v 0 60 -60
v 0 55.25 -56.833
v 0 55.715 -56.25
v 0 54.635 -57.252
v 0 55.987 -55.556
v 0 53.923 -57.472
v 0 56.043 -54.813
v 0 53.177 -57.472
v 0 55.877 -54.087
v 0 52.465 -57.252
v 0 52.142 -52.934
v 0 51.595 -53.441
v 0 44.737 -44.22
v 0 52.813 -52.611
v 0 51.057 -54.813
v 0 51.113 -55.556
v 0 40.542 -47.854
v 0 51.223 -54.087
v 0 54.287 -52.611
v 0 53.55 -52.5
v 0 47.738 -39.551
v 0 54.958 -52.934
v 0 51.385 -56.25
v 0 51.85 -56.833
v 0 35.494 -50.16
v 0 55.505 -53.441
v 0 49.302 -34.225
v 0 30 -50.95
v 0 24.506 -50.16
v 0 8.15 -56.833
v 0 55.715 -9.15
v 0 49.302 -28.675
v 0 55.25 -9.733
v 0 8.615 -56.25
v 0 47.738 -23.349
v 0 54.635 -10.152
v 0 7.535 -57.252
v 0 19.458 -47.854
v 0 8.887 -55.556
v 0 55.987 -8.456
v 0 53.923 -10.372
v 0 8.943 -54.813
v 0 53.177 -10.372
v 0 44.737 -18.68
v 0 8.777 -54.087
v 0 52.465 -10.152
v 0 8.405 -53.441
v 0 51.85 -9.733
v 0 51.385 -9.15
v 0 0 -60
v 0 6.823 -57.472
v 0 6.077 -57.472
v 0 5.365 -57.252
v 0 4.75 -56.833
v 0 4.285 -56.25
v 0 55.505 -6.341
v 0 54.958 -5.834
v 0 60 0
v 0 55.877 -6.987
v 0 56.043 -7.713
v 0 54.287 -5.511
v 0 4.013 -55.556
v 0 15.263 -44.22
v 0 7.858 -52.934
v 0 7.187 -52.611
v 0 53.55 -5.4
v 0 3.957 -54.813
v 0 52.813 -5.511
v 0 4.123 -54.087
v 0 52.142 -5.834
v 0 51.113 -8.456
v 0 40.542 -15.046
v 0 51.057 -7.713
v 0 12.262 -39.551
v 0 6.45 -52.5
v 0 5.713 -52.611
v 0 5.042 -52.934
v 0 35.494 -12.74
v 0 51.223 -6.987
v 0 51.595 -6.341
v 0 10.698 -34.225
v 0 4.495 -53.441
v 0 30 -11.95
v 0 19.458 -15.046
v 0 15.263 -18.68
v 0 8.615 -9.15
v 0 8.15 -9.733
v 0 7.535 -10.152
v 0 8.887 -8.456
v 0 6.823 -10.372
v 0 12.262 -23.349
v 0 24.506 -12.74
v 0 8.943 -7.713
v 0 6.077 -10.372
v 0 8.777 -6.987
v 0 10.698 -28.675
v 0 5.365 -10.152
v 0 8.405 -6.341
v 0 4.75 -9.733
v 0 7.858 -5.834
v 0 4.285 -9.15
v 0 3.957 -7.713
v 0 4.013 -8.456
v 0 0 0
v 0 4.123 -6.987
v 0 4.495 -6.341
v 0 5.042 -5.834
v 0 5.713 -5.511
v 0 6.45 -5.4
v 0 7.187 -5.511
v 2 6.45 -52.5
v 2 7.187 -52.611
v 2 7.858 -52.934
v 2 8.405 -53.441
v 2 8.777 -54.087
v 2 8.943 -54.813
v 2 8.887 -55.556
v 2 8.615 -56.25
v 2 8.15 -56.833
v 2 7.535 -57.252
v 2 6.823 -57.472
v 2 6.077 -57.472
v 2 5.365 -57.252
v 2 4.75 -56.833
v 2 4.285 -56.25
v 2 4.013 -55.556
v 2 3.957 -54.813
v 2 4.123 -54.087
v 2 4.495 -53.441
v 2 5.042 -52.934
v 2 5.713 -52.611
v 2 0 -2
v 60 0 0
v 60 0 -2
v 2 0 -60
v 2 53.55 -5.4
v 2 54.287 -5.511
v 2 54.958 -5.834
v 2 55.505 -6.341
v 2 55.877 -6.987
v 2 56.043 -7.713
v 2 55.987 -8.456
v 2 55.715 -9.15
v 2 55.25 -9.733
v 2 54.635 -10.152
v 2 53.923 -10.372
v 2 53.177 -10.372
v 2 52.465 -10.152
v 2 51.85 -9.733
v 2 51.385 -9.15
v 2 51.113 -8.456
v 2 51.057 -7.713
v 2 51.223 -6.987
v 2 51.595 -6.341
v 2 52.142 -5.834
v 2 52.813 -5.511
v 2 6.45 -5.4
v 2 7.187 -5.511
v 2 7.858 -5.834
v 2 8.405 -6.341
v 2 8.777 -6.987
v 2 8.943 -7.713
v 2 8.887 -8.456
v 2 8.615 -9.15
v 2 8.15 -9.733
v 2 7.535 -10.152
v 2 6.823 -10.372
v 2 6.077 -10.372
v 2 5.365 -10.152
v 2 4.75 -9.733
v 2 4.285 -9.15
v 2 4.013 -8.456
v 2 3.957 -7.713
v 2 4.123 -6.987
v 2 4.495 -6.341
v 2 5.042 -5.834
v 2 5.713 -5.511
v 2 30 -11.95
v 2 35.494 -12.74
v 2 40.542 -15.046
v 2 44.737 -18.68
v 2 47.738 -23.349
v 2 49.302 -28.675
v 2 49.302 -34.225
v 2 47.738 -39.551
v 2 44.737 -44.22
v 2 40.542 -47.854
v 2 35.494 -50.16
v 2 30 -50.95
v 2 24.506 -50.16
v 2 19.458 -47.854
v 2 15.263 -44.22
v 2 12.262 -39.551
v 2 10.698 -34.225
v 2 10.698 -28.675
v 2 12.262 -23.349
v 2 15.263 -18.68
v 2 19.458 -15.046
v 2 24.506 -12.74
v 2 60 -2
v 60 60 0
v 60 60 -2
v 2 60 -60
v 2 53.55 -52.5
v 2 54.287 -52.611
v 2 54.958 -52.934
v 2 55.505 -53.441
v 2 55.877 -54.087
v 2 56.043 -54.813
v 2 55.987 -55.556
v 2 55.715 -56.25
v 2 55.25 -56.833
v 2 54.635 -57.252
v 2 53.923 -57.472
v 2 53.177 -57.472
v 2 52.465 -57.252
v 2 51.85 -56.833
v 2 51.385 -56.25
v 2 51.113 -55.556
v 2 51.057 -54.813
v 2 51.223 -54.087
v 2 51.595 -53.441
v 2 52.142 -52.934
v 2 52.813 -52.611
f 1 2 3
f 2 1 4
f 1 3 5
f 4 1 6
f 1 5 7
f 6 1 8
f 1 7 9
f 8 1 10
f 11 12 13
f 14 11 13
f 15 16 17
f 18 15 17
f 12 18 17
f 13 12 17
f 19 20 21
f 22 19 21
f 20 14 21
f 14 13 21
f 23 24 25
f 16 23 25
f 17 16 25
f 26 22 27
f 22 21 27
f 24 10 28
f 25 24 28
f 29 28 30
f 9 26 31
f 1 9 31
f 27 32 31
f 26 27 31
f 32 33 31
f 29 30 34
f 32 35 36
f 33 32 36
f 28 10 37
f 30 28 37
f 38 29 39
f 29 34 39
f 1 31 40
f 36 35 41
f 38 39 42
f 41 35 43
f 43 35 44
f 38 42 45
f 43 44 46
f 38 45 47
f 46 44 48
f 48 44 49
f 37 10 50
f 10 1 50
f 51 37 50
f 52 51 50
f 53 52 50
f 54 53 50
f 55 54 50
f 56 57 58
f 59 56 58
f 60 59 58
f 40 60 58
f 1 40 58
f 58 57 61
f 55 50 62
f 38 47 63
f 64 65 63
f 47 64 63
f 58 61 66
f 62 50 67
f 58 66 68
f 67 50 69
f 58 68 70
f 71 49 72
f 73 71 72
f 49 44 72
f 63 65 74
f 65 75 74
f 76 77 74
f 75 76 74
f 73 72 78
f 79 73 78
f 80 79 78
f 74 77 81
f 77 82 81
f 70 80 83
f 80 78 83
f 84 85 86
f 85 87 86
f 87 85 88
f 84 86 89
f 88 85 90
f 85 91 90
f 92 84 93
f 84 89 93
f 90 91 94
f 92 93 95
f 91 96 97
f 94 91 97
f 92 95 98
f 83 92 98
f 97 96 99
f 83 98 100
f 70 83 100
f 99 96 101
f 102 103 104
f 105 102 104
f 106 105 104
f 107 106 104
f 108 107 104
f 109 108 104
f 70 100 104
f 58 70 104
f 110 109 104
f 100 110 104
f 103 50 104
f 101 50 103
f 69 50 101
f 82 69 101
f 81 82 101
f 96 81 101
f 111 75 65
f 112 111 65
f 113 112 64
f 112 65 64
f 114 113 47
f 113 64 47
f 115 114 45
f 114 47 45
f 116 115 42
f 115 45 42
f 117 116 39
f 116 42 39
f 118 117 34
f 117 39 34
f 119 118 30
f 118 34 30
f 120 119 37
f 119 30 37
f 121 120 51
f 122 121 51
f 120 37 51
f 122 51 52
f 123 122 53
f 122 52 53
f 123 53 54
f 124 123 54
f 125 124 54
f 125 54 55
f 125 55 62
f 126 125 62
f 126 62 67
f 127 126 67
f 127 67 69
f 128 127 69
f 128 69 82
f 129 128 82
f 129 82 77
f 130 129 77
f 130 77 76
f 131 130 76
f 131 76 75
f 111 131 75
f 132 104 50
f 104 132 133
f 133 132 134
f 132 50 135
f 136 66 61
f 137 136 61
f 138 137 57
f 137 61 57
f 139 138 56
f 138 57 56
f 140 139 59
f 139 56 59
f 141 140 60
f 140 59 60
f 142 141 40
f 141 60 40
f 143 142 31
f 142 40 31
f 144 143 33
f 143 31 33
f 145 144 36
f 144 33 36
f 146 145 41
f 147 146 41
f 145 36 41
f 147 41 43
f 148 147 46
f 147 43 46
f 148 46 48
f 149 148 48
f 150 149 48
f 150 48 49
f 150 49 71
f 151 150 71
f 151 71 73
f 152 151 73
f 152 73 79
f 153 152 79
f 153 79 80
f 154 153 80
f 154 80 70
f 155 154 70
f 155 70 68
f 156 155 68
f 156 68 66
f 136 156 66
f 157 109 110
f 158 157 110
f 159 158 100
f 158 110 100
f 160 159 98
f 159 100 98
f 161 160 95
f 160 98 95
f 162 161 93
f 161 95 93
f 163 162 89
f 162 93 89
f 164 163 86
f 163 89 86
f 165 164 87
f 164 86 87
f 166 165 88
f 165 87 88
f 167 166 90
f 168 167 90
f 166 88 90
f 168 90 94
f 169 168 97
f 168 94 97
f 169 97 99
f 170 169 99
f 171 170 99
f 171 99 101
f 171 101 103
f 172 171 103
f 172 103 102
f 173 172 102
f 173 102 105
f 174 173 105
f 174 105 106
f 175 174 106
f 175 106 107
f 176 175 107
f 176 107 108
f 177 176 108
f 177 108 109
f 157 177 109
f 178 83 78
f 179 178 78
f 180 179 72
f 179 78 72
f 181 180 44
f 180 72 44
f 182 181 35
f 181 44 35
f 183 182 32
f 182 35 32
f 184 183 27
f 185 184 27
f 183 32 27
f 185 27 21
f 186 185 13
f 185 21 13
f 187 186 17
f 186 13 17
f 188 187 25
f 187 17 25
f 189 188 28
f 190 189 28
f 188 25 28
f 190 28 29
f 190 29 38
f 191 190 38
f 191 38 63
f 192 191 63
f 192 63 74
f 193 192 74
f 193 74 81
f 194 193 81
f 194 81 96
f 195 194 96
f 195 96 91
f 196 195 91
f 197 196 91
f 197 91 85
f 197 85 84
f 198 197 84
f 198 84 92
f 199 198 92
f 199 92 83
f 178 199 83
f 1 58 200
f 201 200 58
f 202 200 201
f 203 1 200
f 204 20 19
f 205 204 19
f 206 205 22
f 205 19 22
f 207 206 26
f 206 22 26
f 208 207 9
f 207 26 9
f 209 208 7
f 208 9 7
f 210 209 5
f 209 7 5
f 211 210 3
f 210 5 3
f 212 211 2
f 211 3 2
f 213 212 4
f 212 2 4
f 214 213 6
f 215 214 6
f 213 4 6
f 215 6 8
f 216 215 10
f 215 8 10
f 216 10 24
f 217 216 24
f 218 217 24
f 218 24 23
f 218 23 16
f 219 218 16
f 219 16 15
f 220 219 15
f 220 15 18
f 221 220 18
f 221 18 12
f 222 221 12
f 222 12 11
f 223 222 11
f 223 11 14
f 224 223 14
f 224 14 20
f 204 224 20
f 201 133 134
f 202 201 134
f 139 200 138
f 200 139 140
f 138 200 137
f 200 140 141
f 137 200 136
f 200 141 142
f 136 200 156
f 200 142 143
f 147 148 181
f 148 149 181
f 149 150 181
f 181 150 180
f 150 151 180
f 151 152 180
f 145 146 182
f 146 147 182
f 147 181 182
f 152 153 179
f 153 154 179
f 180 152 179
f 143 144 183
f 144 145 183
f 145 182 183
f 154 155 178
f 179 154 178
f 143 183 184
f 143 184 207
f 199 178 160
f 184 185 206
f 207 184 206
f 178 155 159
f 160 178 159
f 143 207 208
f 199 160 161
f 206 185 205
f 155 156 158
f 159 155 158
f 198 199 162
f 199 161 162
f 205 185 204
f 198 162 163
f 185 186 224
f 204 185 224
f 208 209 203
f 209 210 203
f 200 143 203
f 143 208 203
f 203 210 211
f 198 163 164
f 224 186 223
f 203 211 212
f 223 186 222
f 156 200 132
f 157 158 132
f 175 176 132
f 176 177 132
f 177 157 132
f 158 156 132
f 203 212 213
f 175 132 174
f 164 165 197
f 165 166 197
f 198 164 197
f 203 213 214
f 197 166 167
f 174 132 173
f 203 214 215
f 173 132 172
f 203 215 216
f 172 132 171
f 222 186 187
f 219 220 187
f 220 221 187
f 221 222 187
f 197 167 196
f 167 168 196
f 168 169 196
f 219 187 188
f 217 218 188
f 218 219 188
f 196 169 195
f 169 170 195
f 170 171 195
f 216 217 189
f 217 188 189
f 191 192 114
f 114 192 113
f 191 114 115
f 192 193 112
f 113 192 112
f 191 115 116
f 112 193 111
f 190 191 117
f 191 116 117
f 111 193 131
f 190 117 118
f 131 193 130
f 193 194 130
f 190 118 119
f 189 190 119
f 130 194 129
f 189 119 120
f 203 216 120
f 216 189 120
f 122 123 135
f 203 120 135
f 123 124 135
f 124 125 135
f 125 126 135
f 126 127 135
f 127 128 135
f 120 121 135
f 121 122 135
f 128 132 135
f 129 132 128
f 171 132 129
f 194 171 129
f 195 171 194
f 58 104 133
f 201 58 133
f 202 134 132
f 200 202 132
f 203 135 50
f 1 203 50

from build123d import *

# Parameters (mm, degrees)
BOSS_EXTRUDE1_DEPTH     = 60
SKETCH2_R               = 2.5
SKETCH2_R_2             = 19.5
CUT_EXTRUDE1_DEPTH      = 1
CUT_EXTRUDE1_DEPTH_BACK = 61


with BuildPart() as part:
    # Sketch1 → Boss-Extrude1 (new body)
    with BuildSketch(Plane(origin=(0, 0, 0), x_dir=(1, 0, 0), z_dir=(0, 1, 0))):
        Polygon((0, 60), (0, 0), (60, 0), (60, 2), (2, 2), (2, 60), align=None)
    extrude(amount=BOSS_EXTRUDE1_DEPTH)

    # Sketch2 → Cut-Extrude1 (cut, two sides)
    with BuildSketch(Plane.ZY) as cut_extrude1_sk:
        with Locations((-55, 53.55)):
            Circle(SKETCH2_R)
        with Locations((-7.9, 53.55)):
            Circle(SKETCH2_R)
        with Locations((-7.9, 6.45)):
            Circle(SKETCH2_R)
        with Locations((-55, 6.45)):
            Circle(SKETCH2_R)
        with Locations((-31.45, 30)):
            Circle(SKETCH2_R_2)
    extrude(amount=CUT_EXTRUDE1_DEPTH, mode=Mode.SUBTRACT)
    extrude(cut_extrude1_sk.sketch, amount=-CUT_EXTRUDE1_DEPTH_BACK, mode=Mode.SUBTRACT)


solid = part.part
